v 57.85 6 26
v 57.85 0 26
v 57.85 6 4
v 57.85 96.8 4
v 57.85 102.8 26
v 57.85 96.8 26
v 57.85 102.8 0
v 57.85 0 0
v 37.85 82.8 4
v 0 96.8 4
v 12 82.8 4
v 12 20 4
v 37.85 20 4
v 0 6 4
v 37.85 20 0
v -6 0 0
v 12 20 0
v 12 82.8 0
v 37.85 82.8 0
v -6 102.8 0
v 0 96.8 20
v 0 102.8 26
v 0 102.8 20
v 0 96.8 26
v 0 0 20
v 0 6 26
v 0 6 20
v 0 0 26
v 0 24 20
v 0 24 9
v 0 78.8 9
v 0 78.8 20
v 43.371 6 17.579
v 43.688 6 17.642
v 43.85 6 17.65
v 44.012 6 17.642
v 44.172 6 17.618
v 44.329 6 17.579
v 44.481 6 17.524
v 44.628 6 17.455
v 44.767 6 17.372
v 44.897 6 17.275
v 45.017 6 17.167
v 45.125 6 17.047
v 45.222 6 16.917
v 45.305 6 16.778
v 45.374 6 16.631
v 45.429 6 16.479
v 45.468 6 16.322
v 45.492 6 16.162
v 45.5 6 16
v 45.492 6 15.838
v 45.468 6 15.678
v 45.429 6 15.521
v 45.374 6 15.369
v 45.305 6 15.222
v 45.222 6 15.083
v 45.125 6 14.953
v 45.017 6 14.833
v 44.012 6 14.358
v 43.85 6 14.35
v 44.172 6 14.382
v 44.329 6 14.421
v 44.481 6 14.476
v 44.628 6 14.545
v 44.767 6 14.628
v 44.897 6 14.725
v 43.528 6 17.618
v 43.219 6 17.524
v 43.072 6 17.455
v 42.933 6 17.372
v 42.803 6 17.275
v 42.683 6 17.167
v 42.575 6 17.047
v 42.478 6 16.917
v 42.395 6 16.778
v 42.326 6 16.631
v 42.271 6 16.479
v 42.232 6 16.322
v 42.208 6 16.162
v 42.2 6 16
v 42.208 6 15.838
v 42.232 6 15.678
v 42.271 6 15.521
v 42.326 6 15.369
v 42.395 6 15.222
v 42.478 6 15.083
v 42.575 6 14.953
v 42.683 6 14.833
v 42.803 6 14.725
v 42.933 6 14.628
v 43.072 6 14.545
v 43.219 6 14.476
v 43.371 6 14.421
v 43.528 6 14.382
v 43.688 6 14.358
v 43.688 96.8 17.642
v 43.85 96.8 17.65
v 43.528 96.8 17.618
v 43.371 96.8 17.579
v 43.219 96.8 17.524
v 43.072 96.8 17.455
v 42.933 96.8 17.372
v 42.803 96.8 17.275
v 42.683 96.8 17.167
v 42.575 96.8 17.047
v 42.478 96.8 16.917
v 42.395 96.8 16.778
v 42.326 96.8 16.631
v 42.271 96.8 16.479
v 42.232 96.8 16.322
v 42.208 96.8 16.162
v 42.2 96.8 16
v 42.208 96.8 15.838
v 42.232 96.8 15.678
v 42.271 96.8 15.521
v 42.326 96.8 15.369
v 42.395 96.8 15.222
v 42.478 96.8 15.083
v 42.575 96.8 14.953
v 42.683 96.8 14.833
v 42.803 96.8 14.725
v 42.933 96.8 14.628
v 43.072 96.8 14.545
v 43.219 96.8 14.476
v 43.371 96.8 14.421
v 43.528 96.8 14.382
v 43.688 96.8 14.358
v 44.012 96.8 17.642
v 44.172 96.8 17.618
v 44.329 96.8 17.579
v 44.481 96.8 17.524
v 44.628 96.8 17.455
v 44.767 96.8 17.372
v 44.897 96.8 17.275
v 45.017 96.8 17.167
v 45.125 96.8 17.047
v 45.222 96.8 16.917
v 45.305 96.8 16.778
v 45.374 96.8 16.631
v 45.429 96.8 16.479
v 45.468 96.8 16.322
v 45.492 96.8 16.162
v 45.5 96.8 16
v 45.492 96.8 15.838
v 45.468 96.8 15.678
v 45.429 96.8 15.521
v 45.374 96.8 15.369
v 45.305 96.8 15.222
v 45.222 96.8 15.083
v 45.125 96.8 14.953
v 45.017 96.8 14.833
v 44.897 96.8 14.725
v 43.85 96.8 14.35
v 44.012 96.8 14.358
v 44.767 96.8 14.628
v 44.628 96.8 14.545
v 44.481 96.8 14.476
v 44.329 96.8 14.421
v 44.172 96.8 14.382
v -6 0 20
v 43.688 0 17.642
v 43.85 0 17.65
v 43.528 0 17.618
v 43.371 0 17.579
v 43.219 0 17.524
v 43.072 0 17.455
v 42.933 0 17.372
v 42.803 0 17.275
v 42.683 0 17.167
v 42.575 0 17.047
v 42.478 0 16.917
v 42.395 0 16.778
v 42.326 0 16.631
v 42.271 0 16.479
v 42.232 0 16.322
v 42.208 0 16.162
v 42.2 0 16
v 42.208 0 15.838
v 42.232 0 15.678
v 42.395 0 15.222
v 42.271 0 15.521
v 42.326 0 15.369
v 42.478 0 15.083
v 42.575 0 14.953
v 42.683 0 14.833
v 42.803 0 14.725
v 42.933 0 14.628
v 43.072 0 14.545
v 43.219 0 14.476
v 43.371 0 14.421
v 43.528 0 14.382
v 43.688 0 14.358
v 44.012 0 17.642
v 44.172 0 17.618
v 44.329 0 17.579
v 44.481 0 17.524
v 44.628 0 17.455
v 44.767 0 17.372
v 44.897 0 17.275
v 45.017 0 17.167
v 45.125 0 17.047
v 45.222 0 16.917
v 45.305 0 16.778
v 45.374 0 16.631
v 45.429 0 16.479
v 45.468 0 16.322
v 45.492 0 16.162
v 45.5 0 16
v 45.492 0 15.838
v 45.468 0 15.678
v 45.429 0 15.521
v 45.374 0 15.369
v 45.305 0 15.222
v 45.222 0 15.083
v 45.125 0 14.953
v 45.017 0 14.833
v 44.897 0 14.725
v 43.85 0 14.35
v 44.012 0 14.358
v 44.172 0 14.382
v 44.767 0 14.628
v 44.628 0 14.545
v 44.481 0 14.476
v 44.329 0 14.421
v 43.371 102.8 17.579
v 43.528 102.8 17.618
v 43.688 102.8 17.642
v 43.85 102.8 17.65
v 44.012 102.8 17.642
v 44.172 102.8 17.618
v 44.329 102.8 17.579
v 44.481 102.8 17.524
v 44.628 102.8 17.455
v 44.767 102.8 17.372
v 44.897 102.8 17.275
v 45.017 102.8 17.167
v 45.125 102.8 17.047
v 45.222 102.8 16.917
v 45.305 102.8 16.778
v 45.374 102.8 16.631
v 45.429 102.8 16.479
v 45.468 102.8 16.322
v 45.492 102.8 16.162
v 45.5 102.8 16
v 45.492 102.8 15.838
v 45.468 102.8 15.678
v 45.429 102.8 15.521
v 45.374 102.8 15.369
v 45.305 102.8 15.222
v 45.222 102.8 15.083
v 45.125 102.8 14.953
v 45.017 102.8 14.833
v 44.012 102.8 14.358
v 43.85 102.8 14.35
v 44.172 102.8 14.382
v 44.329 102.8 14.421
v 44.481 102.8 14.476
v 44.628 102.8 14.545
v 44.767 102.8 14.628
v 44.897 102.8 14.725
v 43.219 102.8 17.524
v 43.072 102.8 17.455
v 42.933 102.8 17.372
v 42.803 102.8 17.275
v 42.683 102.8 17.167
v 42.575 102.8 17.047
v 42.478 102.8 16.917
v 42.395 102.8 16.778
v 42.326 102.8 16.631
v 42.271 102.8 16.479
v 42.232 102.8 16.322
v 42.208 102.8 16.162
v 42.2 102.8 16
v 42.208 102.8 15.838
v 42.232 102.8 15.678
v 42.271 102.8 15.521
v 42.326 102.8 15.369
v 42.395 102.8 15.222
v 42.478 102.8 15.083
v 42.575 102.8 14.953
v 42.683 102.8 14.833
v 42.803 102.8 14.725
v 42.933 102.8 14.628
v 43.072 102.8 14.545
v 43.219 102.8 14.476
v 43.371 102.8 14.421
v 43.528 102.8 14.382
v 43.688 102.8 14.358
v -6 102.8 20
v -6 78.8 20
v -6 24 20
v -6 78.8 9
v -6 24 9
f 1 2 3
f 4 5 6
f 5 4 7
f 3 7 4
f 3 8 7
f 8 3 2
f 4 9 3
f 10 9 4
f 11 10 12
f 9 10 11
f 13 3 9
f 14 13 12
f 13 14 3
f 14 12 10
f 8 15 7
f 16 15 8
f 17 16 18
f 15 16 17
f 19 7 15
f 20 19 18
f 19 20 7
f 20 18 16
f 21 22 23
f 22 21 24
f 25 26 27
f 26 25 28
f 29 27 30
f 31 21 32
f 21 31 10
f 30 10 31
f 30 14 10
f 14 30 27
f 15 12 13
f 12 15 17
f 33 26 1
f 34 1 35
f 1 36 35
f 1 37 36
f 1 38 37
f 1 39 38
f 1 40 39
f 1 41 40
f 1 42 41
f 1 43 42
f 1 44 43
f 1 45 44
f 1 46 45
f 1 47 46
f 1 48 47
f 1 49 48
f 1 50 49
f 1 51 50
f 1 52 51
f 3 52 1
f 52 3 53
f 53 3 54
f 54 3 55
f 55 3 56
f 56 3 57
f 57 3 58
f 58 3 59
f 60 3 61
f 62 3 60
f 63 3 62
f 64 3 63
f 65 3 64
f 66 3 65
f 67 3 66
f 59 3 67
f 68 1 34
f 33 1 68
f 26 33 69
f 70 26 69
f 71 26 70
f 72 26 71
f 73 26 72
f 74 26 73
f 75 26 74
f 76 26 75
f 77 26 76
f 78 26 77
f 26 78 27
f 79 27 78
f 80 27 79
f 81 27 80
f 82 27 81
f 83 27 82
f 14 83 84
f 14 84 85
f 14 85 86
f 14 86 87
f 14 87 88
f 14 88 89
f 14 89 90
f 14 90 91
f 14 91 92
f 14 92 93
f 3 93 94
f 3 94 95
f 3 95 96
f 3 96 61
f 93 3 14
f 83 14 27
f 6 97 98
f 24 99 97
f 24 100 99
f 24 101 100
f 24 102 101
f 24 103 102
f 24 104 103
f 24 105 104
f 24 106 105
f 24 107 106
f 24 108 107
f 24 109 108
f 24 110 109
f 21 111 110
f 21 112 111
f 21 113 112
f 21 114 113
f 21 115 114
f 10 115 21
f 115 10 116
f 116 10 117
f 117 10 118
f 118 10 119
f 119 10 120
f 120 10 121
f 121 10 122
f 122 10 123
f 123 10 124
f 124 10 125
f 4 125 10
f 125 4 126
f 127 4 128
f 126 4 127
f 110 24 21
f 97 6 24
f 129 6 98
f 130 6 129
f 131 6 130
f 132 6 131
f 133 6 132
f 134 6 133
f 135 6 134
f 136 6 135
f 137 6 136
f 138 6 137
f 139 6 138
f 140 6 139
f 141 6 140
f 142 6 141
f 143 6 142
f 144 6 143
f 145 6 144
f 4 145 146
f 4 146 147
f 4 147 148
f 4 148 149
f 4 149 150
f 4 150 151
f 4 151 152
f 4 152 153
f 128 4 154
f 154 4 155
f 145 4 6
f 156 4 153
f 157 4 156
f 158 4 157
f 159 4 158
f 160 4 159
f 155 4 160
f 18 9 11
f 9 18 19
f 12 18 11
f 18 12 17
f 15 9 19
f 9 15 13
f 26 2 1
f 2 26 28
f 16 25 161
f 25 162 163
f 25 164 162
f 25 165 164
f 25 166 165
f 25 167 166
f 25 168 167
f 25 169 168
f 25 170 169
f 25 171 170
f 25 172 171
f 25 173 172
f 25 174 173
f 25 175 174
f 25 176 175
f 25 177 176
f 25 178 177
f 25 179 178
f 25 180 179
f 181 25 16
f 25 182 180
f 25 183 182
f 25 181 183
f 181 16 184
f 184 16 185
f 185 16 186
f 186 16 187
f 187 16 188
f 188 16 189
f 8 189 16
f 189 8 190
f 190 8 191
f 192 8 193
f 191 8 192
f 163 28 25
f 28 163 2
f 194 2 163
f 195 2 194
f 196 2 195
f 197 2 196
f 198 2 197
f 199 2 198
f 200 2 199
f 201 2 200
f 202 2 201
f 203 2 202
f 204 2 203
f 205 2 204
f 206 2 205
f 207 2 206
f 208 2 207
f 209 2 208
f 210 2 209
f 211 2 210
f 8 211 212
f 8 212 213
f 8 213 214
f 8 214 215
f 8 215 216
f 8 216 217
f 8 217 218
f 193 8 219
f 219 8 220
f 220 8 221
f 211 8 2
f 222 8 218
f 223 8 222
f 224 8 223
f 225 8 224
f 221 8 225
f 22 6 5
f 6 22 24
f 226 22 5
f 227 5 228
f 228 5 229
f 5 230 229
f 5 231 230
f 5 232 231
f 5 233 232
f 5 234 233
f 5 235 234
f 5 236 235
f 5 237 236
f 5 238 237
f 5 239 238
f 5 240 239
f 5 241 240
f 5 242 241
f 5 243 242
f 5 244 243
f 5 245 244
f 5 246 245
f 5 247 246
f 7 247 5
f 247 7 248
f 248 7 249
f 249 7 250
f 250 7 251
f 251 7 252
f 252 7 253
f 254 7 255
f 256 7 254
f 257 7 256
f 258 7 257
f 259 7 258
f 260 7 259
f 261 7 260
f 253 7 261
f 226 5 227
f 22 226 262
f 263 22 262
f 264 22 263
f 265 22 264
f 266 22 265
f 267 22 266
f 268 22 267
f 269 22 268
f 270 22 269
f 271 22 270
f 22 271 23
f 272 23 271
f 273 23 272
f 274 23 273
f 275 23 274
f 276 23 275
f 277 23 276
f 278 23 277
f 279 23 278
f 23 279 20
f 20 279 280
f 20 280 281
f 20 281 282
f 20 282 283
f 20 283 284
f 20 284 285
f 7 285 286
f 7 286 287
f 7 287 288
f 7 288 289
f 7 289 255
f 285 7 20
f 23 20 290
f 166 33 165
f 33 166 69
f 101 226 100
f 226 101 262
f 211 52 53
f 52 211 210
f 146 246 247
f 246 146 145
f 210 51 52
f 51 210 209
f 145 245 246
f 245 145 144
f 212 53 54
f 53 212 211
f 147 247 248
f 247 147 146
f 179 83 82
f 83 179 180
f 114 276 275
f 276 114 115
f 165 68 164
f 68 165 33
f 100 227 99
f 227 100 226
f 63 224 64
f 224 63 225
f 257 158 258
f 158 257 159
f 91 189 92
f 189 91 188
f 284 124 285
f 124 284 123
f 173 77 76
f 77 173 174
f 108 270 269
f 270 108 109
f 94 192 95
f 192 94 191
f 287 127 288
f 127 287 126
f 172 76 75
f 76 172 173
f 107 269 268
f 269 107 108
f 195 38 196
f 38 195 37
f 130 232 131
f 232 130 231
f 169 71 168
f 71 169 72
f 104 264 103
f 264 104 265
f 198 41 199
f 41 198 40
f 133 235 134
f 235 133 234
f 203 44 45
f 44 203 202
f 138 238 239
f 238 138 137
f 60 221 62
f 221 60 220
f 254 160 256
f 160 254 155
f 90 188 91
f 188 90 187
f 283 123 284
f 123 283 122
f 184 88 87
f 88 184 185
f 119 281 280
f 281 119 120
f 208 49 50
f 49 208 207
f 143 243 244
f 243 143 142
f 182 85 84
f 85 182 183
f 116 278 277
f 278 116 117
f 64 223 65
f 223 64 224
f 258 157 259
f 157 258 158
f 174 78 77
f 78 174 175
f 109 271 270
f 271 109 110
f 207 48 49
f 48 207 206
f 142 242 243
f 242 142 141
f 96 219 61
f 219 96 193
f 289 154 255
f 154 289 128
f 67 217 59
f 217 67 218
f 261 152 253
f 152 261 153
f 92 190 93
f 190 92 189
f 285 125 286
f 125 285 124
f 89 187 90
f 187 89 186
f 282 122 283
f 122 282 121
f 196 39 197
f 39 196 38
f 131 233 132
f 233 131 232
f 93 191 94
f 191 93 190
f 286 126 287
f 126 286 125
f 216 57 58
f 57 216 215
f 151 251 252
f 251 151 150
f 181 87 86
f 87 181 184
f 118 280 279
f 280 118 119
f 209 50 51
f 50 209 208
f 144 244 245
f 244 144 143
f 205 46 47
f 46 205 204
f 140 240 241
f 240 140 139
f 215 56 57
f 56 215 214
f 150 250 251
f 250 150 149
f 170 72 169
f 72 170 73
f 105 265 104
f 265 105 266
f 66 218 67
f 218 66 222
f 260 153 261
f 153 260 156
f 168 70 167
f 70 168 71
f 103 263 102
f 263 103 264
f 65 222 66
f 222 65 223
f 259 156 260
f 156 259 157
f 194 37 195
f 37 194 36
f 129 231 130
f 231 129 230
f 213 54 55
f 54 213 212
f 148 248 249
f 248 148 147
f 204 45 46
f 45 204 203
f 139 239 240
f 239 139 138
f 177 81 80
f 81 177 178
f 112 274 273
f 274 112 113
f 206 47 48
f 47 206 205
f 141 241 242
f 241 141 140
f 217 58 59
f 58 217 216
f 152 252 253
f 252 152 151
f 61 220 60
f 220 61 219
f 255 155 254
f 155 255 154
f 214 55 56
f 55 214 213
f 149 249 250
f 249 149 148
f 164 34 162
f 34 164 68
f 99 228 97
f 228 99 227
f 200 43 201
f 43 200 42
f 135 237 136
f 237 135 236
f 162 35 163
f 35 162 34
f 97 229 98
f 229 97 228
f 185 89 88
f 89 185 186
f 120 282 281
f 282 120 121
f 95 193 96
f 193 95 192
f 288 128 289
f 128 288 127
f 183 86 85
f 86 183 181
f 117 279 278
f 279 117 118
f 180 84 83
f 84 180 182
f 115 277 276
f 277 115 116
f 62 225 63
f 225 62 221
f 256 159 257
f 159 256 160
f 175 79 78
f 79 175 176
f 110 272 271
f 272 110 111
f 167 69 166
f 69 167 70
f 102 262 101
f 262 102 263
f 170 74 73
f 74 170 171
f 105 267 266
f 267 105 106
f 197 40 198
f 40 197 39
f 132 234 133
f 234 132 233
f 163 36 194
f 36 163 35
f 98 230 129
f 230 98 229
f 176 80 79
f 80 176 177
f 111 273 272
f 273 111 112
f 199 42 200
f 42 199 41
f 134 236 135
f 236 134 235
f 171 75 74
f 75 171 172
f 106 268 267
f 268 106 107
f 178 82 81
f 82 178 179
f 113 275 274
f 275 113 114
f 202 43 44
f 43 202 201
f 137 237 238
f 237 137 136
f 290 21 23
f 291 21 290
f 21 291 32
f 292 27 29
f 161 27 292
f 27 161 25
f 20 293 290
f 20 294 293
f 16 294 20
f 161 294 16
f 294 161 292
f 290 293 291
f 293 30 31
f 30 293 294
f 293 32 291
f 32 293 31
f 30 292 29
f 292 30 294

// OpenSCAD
/*
  Smart Water Bowl enclosure side-hole pilot jig

  Purpose
  -------
  Holds the LeMotech 115 x 90 x 55 mm enclosure base and locates one pilot hole
  through each long side wall. The two pilot holes are aligned with the cable
  zip-tie pairs in water_bowl_electronics_carrier.scad V40.

  Coordinate derivation
  ---------------------
  Carrier cable tie pairs begin at Y=34 mm and use:
      slot width along Y = 2.4 mm
      pair spacing       = 10.0 mm

  The cable centerline is midway between the two slot centers:
      34 + 2.4/2 + 10/2 = 40.2 mm from the carrier's lower edge.

  The enclosure drawing gives 115 mm outside length and 109 mm inside length,
  so the nominal end wall is (115-109)/2 = 3.0 mm thick.
  The carrier has 0.65 mm end clearance.

  Therefore the nominal pilot station is:
      3.0 + 0.65 + 40.2 = 43.85 mm from the enclosure's outside end.

  Use
  ---
  1. Put the empty enclosure base into the jig with the chosen short end firmly
     against the end stop.
  2. Clamp the enclosure and jig together.
  3. Drill both pilot holes through the flat locating holes.
  4. Remove the jig and enlarge each hole with a step drill.

  Print orientation
  -----------------
  Print exactly as modeled, flat base down. The side walls remain flat with no
  projecting drill bosses, so no supports are required.
  PETG or ASA is recommended.

  IMPORTANT
  ---------
  The default vertical hole center is 12 mm above the enclosure's outside
  bottom. This is user-adjustable below because the enclosure drawing does not
  define the installed carrier's exact cable center height.
*/

$fn = 64;

// ---------------------------------------------------------------------------
// USER PARAMETERS
// ---------------------------------------------------------------------------

// Enclosure outside dimensions
// These match the LeMotech enclosure used by this project.
enclosure_length = 115.0;
enclosure_width  = 90.0;
enclosure_height = 55.0;

// Enclosure inside length from the manufacturer drawing. This is used to infer
// the nominal thickness of the two short end walls.
enclosure_inside_length = 109.0;

// Carrier geometry used to derive the longitudinal drilling station.
// Keep these synchronized with water_bowl_electronics_carrier.scad.
carrier_end_clearance = 0.65;
zip_pair_y = 34.0;
zip_slot_w = 2.4;
zip_pair_spacing = 10.0;

// Pilot drill opening. A 3.30 mm opening clears a nominal 1/8 inch bit while
// keeping the jig suitable only for locating the pilot. Enlarge the enclosure
// holes afterward with a step drill; do not run the step drill through the jig.
pilot_d = 3.30;

// Vertical pilot-hole center measured from the enclosure's outside bottom.
hole_height_from_bottom = 12.0;

// Jig fit and structure.
side_clearance = 0.40;        // Clearance on each side of the enclosure.
base_t = 4.0;                 // Thickness of the bottom frame rails.
side_wall_t = 6.0;            // Thickness of each flat drilling wall.
side_wall_h = 22.0;           // Height above the jig base.
end_stop_t = 6.0;             // Thickness of the short-end registration stop.
end_stop_h = 16.0;            // Height of the end stop.
station_margin = 14.0;        // Jig extension beyond the pilot-hole center.

// Weight-saving bottom rails.
bottom_rail_w = 14.0;
cross_rail_w = 12.0;

// ---------------------------------------------------------------------------
// DERIVED VALUES
// ---------------------------------------------------------------------------

// Nominal thickness of either short enclosure wall.
nominal_end_wall_t = (enclosure_length - enclosure_inside_length) / 2;

// Cable center measured from the carrier's lower edge. Each rectangular slot's
// center is zip_slot_w/2 from its origin; the cable runs midway between the pair.
cable_center_from_carrier_end =
    zip_pair_y + zip_slot_w/2 + zip_pair_spacing/2;

// Longitudinal pilot location measured from the enclosure's outside short end.
hole_x =
    nominal_end_wall_t +
    carrier_end_clearance +
    cable_center_from_carrier_end;

// Finished clear and outside widths of the jig.
inside_w = enclosure_width + 2*side_clearance;
outside_w = inside_w + 2*side_wall_t;

// The jig only covers the enclosure from the indexing end through the pilot
// station, plus enough material beyond the hole to keep the side walls rigid.
jig_length = hole_x + station_margin;

// OpenSCAD Z coordinate of the pilot center. The enclosure rests on the frame.
hole_z = base_t + hole_height_from_bottom;

// Catch incompatible parameter edits before rendering or printing.
assert(hole_height_from_bottom > pilot_d/2,
       "Pilot hole is too close to the bottom.");
assert(hole_height_from_bottom + pilot_d/2 < side_wall_h,
       "Increase side_wall_h or lower hole_height_from_bottom.");
assert(jig_length < enclosure_length,
       "Jig length unexpectedly exceeds enclosure length.");

// ---------------------------------------------------------------------------
// JIG COMPONENTS
// ---------------------------------------------------------------------------

module bottom_frame() {
    // Two longitudinal rails support the enclosure near its long edges.
    translate([0, side_wall_t, 0])
        cube([jig_length, bottom_rail_w, base_t]);

    translate([0, side_wall_t + inside_w - bottom_rail_w, 0])
        cube([jig_length, bottom_rail_w, base_t]);

    // Three cross rails keep the long side walls parallel and resist spreading.
    translate([0, side_wall_t, 0])
        cube([cross_rail_w, inside_w, base_t]);

    translate([hole_x - cross_rail_w/2, side_wall_t, 0])
        cube([cross_rail_w, inside_w, base_t]);

    translate([jig_length-cross_rail_w, side_wall_t, 0])
        cube([cross_rail_w, inside_w, base_t]);
}

module side_walls_with_pilot_holes() {
    difference() {
        union() {
            // Flat left drilling wall.
            translate([0, 0, 0])
                cube([jig_length, side_wall_t, base_t + side_wall_h]);

            // Flat right drilling wall.
            translate([0, side_wall_t + inside_w, 0])
                cube([jig_length, side_wall_t, base_t + side_wall_h]);
        }

        // One coaxial cutter passes through both walls. Keeping the walls flat
        // avoids unsupported cylindrical bosses and lets the jig print as modeled.
        translate([hole_x, -0.1, hole_z])
            rotate([-90,0,0])
                cylinder(h=outside_w + 0.2, d=pilot_d);
    }
}

module end_stop() {
    // The enclosure's outside short end touches the inner face at X=0.
    // The stop spans the full jig width so orientation is obvious and repeatable.
    translate([-end_stop_t, 0, 0])
        cube([end_stop_t, outside_w, base_t + end_stop_h]);
}

module relief_opening() {
    // Remove the unneeded middle of the end stop while preserving substantial
    // corner registration surfaces and reducing print time and material.
    opening_w = inside_w - 2*18;
    translate([-end_stop_t-0.1, side_wall_t + 18, base_t + 5])
        cube([end_stop_t+0.2, opening_w, end_stop_h]);
}

// ---------------------------------------------------------------------------
// COMPLETE JIG
// ---------------------------------------------------------------------------

difference() {
    union() {
        bottom_frame();
        side_walls_with_pilot_holes();
        end_stop();
    }

    relief_opening();
}

// Optional translucent enclosure envelope for checking fit in OpenSCAD preview.
// Leave false when exporting the jig.
show_enclosure_preview = false;
if (show_enclosure_preview) {
    %translate([0, side_wall_t + side_clearance, base_t])
        cube([enclosure_length, enclosure_width, enclosure_height]);
}

// Print key derived dimensions in the OpenSCAD console for verification.
echo("Pilot station from enclosure outside end (mm): ", hole_x);
echo("Pilot height above enclosure outside bottom (mm): ",
     hole_height_from_bottom);
echo("Jig outside width (mm): ", outside_w);
echo("Jig length excluding end stop (mm): ", jig_length);
